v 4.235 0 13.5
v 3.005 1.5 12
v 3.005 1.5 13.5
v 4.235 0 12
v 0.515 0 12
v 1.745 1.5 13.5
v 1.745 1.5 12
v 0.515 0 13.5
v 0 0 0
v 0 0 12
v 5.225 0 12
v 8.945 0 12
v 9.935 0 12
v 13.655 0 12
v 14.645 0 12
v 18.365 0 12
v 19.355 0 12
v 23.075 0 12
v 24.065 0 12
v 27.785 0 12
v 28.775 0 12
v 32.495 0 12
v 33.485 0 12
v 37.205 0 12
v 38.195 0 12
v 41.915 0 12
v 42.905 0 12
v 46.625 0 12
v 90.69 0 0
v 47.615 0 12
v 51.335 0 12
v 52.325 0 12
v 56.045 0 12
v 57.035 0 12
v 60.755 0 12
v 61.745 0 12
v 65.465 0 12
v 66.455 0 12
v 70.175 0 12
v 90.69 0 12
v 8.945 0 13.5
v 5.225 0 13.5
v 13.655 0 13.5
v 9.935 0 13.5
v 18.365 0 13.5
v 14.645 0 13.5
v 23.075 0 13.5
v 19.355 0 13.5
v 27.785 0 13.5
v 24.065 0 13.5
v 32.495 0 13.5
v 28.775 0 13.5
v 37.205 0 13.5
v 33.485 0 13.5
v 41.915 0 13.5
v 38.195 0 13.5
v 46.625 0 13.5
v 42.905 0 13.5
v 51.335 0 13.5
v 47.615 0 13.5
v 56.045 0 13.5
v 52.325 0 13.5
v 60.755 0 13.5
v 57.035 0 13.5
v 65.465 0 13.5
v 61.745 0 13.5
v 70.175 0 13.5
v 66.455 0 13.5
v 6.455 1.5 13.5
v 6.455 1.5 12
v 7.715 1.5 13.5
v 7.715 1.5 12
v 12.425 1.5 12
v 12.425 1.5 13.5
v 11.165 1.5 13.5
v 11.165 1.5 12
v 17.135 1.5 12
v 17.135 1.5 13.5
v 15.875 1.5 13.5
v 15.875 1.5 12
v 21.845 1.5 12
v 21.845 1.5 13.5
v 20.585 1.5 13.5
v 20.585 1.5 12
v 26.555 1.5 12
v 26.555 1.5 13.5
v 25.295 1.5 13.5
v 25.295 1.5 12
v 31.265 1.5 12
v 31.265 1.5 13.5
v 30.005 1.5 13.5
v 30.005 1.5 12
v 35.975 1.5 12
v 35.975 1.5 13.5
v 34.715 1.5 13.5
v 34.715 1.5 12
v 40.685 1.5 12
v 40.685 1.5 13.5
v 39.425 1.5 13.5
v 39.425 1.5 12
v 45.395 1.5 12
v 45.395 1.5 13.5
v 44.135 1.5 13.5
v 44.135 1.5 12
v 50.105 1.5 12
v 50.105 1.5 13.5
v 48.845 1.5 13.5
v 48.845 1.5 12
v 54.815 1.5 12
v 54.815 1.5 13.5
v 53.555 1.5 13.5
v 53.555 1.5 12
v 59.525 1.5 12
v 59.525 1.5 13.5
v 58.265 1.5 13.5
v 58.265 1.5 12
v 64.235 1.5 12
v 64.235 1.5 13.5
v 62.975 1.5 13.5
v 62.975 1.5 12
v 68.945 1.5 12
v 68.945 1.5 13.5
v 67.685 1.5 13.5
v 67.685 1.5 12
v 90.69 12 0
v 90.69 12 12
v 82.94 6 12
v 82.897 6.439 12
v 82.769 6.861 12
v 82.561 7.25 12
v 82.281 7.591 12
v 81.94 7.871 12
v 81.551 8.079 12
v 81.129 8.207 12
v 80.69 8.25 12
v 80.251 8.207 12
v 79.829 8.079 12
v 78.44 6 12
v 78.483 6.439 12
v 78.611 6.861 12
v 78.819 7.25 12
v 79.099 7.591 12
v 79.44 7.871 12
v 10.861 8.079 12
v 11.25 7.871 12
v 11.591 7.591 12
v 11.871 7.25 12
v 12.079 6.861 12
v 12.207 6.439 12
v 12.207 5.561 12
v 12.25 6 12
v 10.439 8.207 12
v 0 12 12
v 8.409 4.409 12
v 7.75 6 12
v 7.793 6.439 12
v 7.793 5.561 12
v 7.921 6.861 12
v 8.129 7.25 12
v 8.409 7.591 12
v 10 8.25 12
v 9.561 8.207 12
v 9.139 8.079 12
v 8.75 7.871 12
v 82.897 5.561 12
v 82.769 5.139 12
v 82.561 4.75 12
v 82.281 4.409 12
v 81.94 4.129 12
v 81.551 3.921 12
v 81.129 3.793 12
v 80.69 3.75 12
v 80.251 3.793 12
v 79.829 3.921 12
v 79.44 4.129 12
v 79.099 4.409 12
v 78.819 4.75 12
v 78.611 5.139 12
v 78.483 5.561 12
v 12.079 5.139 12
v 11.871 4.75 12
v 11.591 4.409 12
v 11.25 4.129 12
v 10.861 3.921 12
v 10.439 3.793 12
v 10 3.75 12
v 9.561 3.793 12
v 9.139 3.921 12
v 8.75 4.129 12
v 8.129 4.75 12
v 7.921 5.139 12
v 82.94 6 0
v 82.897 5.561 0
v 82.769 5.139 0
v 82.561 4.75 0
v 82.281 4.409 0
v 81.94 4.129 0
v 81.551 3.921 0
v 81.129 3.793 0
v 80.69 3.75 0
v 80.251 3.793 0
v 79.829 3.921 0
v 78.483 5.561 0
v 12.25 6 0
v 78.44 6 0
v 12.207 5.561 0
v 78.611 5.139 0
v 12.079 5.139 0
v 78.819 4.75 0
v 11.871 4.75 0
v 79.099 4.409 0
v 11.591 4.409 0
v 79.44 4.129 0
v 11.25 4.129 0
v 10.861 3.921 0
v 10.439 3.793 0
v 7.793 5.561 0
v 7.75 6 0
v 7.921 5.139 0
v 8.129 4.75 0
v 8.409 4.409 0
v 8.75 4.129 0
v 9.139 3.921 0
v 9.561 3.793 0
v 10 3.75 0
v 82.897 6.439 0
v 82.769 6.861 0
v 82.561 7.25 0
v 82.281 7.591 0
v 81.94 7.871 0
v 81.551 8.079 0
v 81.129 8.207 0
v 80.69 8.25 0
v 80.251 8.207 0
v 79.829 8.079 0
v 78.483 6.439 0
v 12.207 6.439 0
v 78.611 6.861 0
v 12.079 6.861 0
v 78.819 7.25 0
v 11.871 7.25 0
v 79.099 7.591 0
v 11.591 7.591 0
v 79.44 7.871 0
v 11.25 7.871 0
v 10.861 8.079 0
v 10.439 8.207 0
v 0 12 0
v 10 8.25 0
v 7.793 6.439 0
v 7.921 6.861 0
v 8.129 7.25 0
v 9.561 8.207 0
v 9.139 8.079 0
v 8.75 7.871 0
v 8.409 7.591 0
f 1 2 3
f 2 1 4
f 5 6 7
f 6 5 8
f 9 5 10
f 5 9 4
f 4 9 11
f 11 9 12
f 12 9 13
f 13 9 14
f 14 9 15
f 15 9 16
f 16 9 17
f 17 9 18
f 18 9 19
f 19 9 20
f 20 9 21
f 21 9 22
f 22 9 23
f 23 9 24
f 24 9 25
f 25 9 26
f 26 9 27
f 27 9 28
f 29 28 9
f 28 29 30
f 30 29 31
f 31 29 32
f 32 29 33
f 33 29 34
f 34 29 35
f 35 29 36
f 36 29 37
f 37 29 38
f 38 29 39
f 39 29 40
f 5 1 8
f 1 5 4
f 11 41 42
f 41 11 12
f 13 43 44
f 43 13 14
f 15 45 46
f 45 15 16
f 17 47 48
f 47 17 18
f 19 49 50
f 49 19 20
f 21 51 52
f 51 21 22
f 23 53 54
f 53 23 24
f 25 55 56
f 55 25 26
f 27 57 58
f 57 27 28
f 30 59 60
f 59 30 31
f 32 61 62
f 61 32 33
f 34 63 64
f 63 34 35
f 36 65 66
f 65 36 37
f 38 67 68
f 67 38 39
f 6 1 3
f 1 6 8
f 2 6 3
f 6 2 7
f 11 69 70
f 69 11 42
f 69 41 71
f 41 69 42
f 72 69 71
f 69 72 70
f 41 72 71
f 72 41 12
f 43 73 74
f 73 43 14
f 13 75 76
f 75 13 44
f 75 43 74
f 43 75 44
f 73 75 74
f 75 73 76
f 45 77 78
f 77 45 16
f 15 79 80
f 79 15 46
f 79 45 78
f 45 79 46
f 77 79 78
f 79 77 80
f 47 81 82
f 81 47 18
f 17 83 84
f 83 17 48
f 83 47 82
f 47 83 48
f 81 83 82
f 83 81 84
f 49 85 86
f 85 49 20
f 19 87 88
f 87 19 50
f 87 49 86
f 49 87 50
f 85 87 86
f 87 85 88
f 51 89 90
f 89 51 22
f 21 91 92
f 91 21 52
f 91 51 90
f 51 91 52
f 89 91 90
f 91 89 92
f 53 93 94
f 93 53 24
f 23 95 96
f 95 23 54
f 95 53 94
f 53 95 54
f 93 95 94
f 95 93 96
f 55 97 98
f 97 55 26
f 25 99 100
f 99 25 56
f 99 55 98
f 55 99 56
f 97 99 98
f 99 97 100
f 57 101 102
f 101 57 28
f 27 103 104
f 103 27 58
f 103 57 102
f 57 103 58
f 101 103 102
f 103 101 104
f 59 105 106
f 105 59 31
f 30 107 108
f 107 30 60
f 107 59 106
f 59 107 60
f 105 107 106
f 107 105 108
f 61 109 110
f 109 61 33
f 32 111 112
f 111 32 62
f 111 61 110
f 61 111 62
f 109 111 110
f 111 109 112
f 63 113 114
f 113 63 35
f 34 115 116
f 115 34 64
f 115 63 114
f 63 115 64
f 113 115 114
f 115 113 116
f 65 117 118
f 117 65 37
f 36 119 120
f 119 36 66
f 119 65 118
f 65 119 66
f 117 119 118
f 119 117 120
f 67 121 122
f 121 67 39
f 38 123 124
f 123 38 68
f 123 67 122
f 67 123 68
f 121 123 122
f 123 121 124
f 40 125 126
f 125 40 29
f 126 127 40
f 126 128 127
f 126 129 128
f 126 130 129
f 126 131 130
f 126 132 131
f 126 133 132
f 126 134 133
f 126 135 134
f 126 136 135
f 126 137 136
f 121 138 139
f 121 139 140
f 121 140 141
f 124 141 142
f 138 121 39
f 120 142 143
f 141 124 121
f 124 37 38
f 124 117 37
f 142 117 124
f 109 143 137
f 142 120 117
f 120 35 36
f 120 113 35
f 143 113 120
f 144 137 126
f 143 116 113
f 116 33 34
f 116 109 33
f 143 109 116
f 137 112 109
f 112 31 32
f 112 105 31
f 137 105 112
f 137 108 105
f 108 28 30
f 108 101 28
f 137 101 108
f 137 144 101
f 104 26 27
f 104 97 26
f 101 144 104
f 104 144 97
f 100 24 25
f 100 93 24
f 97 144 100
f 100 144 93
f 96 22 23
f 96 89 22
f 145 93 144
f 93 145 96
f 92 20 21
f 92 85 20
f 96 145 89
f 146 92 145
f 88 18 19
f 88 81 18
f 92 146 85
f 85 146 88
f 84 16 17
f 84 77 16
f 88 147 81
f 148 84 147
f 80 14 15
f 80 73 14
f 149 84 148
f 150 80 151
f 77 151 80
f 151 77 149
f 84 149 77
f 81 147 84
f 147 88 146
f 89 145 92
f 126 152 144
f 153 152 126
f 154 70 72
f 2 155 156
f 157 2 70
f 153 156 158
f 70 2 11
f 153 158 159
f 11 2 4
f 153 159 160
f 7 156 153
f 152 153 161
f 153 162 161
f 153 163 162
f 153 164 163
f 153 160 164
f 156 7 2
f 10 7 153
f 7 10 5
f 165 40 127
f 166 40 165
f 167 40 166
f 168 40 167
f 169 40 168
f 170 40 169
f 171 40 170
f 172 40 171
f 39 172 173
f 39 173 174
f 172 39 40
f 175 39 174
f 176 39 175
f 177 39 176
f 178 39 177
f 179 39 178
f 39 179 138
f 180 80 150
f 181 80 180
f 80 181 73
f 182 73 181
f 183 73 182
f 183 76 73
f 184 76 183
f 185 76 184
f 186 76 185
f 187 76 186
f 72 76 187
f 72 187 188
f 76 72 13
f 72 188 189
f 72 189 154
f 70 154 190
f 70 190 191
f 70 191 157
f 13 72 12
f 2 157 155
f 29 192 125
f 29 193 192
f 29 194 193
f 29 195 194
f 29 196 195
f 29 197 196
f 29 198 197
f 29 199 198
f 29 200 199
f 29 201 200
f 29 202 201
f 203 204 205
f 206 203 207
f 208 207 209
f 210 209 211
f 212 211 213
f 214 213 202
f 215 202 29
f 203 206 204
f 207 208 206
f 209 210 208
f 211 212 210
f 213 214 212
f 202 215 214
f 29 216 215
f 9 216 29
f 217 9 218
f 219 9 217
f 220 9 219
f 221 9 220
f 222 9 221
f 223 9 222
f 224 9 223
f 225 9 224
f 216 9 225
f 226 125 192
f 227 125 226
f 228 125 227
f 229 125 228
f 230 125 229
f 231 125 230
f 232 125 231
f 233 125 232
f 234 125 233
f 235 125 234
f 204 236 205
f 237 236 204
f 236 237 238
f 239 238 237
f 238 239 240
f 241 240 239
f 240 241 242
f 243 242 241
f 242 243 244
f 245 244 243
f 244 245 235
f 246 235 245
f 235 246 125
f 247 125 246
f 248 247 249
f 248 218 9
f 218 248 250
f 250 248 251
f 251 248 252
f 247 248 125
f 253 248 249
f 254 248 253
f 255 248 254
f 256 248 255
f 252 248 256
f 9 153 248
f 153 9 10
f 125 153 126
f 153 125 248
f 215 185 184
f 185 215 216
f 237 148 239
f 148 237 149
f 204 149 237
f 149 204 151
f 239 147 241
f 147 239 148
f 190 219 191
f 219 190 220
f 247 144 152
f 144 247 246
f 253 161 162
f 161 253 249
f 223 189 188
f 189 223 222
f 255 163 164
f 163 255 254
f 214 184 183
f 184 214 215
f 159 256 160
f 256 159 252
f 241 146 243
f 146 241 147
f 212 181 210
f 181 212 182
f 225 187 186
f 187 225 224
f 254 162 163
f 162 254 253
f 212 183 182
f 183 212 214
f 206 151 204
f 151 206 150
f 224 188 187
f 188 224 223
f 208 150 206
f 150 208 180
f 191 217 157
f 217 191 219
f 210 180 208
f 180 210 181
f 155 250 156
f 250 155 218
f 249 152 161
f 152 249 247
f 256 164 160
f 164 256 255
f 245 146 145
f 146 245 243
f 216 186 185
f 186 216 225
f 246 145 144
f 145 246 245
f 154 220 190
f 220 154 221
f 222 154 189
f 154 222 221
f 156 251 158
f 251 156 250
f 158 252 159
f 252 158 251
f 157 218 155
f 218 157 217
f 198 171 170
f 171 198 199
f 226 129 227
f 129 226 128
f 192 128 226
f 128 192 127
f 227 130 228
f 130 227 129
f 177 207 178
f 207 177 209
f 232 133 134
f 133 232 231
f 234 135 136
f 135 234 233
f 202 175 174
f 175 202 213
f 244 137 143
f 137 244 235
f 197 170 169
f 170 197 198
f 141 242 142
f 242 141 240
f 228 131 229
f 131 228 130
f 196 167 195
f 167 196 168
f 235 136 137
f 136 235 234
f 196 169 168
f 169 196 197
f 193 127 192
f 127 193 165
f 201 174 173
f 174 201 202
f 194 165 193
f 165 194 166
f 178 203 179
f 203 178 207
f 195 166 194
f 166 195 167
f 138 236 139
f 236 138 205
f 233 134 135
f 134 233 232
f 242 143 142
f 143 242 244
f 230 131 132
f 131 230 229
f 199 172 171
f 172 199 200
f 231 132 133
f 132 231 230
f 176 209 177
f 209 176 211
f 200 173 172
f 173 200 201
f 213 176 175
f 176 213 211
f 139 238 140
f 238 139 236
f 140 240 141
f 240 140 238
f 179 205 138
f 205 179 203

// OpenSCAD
$fn = 32;

// ----------------------------------------------------------------------
// Gear rack: m=1.5 z=15, 90.69 x 12 x 13.5 mm
// ----------------------------------------------------------------------

// --- parameters (mm) ---
length = 90.69;           // rack length, X
width = 12;               // rack width, Y
height = 13.5;            // overall height, Z
module_m = 1.5;           // module
back_t = 12;              // tooth root line height
pitch = 4.71;             // circular pitch
tip_w = 1.26;             // tooth thickness at the tip
root_w = 3.72;            // tooth thickness at the root line
hole_d = 4.5;             // mounting hole
sink = 0.6;               // tooth root overlap into the body

tooth_span = 70.69;

module tooth(x0) {
  /* 20 deg flank profile, sunk into the body for a positive overlap */
  translate([x0, 0, back_t - sink])
    linear_extrude(height = height - back_t + sink)
      polygon(points = [[-root_w / 2, 0], [root_w / 2, 0],
                        [tip_w / 2, height - back_t],
                        [-tip_w / 2, height - back_t]]);
}

difference() {
  union() {
    cube([length, width, back_t]);
    for (i = [0 : 15 - 1])
      tooth((i + 0.5) * pitch + (tooth_span - 15 * pitch) / 2);
  }
  translate([10, 6, -1]) cylinder(h = back_t + 2, d = hole_d);
  translate([80.69, 6, -1]) cylinder(h = back_t + 2, d = hole_d);
}
